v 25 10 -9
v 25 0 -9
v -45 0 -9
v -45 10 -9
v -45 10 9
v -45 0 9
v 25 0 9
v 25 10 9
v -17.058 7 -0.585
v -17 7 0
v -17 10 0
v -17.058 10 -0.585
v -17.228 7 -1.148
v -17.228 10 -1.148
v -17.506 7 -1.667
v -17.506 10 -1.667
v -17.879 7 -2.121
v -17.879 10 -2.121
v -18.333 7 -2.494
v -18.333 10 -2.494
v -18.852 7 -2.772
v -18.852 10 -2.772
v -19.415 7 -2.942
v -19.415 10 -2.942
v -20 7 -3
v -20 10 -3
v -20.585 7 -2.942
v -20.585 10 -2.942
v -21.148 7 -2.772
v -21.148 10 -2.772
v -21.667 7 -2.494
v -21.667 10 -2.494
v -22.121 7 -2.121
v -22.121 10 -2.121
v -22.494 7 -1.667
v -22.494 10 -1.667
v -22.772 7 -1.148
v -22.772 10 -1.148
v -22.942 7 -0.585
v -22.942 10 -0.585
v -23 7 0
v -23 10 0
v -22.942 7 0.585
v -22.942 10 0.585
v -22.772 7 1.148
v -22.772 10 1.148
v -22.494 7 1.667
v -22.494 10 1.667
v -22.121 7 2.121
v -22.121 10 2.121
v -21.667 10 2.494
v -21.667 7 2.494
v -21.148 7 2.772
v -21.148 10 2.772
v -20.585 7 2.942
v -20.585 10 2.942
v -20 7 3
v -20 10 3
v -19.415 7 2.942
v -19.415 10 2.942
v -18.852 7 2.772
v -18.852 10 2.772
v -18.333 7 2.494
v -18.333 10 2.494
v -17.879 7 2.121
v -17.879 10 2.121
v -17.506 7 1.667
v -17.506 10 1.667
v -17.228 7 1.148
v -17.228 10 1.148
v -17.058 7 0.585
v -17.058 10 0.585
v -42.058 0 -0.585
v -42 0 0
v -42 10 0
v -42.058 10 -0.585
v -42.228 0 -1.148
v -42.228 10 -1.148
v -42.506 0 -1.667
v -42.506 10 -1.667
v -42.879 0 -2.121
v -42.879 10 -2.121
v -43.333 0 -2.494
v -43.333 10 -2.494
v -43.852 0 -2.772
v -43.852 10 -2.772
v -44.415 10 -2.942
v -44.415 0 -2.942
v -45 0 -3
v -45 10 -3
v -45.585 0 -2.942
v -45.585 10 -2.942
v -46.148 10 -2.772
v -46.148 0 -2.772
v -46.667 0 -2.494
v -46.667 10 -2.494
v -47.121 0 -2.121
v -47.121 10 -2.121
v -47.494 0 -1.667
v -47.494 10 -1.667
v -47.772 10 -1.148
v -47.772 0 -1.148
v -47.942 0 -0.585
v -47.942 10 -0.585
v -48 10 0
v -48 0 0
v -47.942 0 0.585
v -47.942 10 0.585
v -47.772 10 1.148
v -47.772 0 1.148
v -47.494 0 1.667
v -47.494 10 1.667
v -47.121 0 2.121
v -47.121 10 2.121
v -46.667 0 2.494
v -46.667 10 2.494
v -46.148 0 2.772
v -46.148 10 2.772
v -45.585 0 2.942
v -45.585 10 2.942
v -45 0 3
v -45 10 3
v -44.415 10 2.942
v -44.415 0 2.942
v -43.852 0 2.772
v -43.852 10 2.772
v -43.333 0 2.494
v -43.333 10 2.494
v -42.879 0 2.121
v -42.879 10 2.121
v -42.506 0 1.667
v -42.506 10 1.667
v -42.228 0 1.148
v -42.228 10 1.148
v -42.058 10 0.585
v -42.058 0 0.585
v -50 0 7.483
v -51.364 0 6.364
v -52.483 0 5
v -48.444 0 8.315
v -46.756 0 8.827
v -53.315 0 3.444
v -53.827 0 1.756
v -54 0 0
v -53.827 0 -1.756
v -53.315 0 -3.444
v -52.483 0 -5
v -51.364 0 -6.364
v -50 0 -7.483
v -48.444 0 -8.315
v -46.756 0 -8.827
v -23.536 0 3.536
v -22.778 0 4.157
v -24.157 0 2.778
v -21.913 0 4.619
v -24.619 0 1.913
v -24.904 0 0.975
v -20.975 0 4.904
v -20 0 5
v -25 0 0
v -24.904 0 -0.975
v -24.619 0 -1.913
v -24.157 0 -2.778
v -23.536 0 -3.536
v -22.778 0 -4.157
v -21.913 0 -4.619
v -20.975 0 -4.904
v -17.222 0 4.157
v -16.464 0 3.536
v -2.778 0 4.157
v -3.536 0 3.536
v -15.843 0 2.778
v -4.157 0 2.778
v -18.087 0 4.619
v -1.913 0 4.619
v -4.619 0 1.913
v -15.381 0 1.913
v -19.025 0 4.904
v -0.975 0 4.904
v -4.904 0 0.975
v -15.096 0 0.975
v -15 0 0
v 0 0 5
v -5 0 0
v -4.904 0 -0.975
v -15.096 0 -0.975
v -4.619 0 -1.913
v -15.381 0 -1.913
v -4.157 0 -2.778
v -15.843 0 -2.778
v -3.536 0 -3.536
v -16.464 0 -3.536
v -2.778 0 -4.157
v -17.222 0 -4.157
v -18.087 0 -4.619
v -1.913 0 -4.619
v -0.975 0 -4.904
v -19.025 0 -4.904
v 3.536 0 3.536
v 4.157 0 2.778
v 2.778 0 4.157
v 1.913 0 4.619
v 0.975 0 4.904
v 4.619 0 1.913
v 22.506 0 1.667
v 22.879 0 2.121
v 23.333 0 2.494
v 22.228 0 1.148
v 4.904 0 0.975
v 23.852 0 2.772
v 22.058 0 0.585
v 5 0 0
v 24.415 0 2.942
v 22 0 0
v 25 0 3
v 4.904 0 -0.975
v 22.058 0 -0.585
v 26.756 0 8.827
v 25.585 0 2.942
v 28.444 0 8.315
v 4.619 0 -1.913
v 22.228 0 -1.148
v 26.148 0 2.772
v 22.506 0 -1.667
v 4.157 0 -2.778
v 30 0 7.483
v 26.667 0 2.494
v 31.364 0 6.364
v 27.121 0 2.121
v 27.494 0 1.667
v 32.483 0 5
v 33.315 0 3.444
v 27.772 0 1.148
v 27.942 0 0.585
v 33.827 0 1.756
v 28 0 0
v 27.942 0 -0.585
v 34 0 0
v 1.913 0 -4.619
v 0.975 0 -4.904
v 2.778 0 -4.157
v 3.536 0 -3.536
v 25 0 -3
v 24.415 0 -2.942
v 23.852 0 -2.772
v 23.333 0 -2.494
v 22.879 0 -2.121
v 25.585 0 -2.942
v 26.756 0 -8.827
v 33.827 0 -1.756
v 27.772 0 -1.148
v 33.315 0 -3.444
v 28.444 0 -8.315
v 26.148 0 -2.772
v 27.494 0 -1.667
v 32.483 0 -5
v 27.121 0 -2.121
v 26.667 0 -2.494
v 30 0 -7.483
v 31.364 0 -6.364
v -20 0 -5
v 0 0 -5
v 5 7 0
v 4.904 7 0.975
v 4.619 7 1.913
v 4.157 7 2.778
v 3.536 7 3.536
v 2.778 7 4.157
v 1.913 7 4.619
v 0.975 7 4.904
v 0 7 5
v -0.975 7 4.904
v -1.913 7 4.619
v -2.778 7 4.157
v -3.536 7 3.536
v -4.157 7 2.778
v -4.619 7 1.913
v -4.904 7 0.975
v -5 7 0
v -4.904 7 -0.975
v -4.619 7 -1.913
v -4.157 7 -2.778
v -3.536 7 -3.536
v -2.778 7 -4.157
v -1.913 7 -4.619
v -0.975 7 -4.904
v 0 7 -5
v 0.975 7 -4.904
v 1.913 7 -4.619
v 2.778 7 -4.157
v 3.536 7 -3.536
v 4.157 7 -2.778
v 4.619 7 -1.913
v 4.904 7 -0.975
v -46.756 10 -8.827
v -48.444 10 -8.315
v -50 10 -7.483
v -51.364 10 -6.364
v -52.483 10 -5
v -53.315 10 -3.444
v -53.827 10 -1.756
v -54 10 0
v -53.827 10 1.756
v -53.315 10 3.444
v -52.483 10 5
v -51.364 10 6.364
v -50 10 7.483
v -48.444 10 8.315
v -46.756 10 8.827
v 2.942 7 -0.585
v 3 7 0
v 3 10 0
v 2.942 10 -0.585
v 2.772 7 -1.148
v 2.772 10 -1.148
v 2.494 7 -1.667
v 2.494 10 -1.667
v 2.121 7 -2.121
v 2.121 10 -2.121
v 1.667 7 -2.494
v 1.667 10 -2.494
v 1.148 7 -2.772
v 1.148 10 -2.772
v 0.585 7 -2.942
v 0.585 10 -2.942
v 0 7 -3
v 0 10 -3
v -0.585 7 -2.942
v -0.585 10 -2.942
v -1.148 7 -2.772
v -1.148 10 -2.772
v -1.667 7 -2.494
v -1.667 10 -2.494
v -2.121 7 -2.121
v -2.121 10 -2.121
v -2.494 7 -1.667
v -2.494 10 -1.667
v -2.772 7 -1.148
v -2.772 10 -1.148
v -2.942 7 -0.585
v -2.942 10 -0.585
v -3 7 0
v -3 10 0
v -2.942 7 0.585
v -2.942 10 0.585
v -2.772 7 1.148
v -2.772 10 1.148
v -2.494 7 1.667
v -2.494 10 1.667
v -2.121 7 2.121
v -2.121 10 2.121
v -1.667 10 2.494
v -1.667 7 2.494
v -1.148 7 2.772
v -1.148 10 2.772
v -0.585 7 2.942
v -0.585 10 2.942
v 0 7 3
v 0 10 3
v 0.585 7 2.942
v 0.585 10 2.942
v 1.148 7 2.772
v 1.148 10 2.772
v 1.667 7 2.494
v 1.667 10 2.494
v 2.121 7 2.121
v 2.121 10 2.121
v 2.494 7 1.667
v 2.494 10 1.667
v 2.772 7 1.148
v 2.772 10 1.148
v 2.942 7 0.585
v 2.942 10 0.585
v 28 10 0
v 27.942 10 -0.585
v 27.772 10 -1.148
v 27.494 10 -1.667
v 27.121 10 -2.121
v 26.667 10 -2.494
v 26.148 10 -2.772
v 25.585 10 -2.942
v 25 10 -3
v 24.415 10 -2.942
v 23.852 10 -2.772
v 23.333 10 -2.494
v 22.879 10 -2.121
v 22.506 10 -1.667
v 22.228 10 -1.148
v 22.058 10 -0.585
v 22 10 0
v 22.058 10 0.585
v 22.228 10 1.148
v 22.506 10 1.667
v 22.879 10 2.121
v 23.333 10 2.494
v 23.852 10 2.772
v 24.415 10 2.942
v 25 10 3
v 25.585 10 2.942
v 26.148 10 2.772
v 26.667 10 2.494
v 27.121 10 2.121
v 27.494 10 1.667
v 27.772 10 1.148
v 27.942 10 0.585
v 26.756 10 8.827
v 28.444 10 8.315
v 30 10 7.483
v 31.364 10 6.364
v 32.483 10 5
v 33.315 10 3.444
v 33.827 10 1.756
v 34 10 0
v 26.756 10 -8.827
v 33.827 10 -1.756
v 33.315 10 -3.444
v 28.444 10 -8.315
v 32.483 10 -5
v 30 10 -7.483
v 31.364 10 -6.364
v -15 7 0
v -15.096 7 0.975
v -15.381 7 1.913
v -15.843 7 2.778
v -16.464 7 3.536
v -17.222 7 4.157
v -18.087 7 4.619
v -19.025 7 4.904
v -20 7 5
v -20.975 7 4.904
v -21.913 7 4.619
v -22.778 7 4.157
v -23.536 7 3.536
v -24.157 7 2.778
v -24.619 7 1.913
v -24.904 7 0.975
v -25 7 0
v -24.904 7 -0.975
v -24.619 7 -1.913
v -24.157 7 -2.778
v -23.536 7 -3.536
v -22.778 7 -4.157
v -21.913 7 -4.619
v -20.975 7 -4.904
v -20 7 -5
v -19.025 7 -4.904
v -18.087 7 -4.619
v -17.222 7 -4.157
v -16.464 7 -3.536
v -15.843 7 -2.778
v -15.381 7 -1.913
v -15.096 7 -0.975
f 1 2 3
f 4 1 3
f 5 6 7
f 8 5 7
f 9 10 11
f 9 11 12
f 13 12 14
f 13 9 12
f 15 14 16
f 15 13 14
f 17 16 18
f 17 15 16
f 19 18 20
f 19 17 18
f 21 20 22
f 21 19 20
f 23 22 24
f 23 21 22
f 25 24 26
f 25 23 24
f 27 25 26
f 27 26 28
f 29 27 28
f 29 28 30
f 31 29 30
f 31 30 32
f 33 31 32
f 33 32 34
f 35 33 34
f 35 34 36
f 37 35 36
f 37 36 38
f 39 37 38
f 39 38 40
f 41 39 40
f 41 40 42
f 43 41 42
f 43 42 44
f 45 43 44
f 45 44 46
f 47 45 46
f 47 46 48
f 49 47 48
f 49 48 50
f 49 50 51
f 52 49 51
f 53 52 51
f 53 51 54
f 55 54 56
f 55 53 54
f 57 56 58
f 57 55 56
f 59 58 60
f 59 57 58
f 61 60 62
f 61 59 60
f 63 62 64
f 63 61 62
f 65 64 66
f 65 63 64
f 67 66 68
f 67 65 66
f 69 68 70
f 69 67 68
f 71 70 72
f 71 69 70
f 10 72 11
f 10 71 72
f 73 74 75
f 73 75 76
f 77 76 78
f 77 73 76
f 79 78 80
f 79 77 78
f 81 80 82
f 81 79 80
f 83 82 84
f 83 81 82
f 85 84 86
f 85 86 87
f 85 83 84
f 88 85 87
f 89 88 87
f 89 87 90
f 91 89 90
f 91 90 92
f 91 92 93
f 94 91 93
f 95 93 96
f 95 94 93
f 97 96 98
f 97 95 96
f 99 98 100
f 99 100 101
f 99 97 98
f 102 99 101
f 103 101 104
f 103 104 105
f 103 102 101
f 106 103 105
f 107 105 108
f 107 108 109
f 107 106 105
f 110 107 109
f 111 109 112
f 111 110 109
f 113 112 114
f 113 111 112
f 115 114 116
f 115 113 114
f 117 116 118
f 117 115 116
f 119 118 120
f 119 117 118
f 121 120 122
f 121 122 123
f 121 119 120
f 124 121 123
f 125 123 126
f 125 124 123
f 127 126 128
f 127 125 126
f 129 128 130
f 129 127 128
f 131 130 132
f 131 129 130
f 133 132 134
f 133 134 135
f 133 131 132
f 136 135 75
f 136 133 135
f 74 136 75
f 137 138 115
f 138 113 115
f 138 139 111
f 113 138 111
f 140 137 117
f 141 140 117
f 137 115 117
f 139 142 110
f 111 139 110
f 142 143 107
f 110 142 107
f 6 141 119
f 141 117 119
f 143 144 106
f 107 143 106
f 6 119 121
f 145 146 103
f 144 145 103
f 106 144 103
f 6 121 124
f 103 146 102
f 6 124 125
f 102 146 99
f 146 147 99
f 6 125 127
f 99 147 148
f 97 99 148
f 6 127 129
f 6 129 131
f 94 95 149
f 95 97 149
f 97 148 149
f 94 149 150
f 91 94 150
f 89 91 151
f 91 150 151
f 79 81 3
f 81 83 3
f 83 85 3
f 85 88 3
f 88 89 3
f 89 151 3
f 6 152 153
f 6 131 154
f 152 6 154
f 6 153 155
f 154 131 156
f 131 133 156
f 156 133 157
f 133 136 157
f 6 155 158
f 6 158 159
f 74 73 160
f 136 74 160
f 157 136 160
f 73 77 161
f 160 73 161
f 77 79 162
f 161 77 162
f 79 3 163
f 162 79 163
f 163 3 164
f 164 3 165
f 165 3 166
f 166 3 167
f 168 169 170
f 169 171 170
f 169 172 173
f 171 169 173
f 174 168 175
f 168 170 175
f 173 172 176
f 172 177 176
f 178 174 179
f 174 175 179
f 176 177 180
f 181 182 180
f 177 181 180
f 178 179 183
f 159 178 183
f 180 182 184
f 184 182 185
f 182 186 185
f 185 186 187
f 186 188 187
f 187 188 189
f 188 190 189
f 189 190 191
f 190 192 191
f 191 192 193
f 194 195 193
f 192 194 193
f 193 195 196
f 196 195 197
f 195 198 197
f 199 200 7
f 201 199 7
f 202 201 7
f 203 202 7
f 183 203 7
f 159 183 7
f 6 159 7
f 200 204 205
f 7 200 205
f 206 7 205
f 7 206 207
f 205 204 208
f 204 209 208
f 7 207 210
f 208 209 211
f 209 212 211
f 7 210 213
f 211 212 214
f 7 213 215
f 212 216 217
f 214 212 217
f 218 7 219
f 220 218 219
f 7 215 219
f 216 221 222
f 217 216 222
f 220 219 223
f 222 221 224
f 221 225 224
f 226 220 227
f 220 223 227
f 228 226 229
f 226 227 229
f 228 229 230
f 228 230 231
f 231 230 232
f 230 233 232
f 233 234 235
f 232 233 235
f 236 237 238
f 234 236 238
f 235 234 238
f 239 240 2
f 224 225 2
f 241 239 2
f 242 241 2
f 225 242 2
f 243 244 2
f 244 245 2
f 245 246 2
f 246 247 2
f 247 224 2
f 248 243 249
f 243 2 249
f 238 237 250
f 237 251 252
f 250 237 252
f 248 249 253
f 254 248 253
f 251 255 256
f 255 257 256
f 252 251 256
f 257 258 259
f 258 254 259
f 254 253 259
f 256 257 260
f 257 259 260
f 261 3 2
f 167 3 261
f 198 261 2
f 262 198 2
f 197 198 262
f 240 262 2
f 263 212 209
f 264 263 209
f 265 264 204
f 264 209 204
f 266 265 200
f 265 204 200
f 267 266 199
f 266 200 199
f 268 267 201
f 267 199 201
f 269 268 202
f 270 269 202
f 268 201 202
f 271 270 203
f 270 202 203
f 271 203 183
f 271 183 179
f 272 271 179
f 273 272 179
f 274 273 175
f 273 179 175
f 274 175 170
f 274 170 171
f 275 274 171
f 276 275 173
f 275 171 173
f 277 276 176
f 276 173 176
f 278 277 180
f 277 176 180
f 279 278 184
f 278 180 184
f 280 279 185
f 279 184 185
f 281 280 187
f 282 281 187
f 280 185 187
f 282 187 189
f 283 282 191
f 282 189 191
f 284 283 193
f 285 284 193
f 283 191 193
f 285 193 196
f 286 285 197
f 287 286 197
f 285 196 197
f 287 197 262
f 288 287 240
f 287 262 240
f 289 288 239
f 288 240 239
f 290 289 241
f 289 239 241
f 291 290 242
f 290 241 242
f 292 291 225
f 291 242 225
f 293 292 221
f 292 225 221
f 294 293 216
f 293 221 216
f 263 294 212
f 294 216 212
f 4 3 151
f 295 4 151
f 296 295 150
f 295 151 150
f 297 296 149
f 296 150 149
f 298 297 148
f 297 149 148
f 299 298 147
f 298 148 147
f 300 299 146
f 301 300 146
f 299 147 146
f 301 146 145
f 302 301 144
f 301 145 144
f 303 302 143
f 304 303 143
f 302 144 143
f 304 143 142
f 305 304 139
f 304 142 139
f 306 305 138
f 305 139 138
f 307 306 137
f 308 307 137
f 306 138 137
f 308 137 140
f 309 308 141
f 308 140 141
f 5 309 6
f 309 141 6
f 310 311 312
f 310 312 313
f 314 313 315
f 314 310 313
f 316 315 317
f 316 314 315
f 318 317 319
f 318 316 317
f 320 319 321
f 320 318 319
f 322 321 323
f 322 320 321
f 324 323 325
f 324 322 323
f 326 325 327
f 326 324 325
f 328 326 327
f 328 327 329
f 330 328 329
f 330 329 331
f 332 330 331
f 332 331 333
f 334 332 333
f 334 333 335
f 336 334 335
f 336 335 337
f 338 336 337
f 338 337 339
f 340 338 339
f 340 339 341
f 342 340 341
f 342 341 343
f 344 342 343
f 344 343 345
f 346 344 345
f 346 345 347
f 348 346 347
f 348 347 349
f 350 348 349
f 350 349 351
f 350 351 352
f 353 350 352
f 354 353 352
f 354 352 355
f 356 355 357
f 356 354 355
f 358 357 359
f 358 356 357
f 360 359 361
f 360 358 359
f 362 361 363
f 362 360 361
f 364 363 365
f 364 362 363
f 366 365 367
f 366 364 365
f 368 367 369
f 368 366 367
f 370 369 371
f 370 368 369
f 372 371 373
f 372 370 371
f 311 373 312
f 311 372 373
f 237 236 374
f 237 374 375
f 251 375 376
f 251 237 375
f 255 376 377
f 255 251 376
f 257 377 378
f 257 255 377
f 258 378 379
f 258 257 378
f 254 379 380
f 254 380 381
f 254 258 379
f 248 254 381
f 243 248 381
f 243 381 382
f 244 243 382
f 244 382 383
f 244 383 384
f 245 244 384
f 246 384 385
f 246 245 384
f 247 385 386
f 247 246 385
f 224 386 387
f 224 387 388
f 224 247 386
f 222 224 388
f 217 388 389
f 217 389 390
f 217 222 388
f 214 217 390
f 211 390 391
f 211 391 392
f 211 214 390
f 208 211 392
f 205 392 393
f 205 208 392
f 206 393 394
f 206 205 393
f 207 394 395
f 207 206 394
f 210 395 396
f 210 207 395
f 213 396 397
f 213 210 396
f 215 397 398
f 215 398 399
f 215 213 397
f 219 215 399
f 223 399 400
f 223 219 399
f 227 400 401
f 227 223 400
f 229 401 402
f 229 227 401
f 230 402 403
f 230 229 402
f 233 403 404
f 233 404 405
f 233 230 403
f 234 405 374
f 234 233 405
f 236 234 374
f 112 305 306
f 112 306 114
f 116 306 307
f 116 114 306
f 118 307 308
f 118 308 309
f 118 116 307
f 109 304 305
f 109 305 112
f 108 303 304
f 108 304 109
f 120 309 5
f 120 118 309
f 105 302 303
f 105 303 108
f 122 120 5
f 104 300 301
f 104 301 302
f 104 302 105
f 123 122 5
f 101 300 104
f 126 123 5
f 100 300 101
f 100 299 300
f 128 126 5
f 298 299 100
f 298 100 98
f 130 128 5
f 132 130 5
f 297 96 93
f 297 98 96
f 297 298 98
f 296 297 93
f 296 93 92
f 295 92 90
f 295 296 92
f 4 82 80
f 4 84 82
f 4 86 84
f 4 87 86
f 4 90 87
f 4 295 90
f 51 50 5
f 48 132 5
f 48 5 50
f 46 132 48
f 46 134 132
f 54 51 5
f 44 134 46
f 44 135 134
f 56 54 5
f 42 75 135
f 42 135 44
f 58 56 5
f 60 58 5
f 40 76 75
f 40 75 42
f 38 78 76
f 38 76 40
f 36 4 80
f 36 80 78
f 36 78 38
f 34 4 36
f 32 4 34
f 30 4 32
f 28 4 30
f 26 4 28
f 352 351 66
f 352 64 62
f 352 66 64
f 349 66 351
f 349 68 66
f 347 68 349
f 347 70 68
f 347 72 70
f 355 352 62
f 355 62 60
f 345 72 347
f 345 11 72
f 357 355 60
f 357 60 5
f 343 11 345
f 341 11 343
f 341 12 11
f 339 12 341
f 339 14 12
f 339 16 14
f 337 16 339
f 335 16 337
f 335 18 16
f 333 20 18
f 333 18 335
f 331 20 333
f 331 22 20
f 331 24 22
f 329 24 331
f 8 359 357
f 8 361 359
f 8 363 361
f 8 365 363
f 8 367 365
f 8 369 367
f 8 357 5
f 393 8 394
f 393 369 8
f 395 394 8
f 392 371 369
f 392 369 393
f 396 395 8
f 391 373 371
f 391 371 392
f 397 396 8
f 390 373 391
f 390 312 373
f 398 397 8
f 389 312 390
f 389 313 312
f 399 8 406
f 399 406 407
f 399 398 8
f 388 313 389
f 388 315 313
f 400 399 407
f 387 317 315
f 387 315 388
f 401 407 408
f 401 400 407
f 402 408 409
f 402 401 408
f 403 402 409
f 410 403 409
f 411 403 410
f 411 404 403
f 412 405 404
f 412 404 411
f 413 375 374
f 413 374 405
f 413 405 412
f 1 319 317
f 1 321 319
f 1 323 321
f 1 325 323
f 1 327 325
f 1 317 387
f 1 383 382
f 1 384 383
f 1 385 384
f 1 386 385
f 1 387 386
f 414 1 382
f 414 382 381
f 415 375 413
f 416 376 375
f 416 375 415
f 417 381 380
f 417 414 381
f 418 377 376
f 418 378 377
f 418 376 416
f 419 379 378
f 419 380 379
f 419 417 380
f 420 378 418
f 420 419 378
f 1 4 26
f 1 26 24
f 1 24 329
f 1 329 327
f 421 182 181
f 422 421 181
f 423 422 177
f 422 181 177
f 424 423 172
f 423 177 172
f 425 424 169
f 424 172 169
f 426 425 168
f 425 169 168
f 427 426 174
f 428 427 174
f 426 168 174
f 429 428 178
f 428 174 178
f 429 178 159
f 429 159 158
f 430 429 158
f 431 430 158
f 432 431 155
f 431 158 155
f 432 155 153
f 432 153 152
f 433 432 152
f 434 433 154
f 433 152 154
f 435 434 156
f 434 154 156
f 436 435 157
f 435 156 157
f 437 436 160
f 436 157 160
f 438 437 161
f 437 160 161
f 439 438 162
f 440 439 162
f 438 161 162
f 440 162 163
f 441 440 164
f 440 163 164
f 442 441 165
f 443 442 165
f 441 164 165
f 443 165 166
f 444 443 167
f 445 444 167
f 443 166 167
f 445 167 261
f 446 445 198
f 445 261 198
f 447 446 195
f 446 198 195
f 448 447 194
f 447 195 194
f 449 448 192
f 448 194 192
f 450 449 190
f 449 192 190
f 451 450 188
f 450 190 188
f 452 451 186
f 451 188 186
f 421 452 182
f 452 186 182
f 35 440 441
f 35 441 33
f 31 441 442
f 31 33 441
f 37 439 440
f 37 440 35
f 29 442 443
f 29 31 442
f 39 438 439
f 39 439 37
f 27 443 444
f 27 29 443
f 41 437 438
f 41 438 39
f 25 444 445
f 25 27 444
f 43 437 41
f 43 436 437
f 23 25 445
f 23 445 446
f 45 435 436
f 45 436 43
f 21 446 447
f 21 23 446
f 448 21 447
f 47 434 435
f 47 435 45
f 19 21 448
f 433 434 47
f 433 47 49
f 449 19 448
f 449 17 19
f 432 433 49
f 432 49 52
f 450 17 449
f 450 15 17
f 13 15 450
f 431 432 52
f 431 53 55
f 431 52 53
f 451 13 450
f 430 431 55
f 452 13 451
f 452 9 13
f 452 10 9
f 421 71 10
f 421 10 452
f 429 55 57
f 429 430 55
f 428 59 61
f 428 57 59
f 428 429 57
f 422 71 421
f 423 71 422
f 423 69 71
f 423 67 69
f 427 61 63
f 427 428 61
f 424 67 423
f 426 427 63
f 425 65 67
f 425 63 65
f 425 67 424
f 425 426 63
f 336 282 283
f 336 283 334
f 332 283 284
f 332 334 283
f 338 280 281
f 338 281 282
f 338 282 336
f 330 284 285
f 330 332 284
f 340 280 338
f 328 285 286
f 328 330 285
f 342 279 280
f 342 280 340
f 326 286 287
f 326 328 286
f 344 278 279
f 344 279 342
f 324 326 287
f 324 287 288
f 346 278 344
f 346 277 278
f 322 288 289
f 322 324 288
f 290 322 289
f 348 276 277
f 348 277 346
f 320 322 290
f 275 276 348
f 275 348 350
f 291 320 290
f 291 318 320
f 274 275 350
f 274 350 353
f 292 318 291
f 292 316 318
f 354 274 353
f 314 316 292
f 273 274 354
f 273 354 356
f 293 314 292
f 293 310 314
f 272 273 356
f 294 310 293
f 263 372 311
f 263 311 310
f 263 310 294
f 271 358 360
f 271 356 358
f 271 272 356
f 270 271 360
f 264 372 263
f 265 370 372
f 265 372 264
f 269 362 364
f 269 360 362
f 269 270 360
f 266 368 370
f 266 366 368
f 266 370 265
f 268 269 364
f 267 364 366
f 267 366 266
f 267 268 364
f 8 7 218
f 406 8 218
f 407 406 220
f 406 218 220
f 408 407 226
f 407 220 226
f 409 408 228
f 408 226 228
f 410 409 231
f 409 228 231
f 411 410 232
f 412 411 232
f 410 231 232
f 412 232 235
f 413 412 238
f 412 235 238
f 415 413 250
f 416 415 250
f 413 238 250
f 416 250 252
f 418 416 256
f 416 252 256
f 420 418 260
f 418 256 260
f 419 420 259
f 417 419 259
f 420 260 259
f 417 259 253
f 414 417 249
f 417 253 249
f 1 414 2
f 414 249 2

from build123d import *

# Parameters (mm, degrees)
SKETCH2_R           = 3
BOSS_EXTRUDE1_DEPTH = 10
SKETCH3_R           = 5
CUT_EXTRUDE1_DEPTH  = 7


with BuildPart() as part:
    # Sketch2 → Boss-Extrude1 (new body)
    with BuildSketch(Plane(origin=(0, 0, 0), x_dir=(1, 0, 0), z_dir=(0, 1, 0))):
        with BuildLine():
            ThreePointArc((25, -9), (34, 0), (25, 9))
            Line((25, 9), (-45, 9))
            ThreePointArc((-45, 9), (-54, 0), (-45, -9))
            Line((-45, -9), (25, -9))
        make_face()
        with Locations((-20, 0)):
            Circle(SKETCH2_R, mode=Mode.SUBTRACT)
        Circle(SKETCH2_R, mode=Mode.SUBTRACT)
        with Locations((25, 0)):
            Circle(SKETCH2_R, mode=Mode.SUBTRACT)
        with Locations((-45, 0)):
            Circle(SKETCH2_R, mode=Mode.SUBTRACT)
    extrude(amount=BOSS_EXTRUDE1_DEPTH)

    # Sketch3 → Cut-Extrude1 (cut)
    with BuildSketch(Plane.XZ):
        with Locations((-20, 0)):
            Circle(SKETCH3_R)
        Circle(SKETCH3_R)
    extrude(amount=-CUT_EXTRUDE1_DEPTH, mode=Mode.SUBTRACT)


solid = part.part
